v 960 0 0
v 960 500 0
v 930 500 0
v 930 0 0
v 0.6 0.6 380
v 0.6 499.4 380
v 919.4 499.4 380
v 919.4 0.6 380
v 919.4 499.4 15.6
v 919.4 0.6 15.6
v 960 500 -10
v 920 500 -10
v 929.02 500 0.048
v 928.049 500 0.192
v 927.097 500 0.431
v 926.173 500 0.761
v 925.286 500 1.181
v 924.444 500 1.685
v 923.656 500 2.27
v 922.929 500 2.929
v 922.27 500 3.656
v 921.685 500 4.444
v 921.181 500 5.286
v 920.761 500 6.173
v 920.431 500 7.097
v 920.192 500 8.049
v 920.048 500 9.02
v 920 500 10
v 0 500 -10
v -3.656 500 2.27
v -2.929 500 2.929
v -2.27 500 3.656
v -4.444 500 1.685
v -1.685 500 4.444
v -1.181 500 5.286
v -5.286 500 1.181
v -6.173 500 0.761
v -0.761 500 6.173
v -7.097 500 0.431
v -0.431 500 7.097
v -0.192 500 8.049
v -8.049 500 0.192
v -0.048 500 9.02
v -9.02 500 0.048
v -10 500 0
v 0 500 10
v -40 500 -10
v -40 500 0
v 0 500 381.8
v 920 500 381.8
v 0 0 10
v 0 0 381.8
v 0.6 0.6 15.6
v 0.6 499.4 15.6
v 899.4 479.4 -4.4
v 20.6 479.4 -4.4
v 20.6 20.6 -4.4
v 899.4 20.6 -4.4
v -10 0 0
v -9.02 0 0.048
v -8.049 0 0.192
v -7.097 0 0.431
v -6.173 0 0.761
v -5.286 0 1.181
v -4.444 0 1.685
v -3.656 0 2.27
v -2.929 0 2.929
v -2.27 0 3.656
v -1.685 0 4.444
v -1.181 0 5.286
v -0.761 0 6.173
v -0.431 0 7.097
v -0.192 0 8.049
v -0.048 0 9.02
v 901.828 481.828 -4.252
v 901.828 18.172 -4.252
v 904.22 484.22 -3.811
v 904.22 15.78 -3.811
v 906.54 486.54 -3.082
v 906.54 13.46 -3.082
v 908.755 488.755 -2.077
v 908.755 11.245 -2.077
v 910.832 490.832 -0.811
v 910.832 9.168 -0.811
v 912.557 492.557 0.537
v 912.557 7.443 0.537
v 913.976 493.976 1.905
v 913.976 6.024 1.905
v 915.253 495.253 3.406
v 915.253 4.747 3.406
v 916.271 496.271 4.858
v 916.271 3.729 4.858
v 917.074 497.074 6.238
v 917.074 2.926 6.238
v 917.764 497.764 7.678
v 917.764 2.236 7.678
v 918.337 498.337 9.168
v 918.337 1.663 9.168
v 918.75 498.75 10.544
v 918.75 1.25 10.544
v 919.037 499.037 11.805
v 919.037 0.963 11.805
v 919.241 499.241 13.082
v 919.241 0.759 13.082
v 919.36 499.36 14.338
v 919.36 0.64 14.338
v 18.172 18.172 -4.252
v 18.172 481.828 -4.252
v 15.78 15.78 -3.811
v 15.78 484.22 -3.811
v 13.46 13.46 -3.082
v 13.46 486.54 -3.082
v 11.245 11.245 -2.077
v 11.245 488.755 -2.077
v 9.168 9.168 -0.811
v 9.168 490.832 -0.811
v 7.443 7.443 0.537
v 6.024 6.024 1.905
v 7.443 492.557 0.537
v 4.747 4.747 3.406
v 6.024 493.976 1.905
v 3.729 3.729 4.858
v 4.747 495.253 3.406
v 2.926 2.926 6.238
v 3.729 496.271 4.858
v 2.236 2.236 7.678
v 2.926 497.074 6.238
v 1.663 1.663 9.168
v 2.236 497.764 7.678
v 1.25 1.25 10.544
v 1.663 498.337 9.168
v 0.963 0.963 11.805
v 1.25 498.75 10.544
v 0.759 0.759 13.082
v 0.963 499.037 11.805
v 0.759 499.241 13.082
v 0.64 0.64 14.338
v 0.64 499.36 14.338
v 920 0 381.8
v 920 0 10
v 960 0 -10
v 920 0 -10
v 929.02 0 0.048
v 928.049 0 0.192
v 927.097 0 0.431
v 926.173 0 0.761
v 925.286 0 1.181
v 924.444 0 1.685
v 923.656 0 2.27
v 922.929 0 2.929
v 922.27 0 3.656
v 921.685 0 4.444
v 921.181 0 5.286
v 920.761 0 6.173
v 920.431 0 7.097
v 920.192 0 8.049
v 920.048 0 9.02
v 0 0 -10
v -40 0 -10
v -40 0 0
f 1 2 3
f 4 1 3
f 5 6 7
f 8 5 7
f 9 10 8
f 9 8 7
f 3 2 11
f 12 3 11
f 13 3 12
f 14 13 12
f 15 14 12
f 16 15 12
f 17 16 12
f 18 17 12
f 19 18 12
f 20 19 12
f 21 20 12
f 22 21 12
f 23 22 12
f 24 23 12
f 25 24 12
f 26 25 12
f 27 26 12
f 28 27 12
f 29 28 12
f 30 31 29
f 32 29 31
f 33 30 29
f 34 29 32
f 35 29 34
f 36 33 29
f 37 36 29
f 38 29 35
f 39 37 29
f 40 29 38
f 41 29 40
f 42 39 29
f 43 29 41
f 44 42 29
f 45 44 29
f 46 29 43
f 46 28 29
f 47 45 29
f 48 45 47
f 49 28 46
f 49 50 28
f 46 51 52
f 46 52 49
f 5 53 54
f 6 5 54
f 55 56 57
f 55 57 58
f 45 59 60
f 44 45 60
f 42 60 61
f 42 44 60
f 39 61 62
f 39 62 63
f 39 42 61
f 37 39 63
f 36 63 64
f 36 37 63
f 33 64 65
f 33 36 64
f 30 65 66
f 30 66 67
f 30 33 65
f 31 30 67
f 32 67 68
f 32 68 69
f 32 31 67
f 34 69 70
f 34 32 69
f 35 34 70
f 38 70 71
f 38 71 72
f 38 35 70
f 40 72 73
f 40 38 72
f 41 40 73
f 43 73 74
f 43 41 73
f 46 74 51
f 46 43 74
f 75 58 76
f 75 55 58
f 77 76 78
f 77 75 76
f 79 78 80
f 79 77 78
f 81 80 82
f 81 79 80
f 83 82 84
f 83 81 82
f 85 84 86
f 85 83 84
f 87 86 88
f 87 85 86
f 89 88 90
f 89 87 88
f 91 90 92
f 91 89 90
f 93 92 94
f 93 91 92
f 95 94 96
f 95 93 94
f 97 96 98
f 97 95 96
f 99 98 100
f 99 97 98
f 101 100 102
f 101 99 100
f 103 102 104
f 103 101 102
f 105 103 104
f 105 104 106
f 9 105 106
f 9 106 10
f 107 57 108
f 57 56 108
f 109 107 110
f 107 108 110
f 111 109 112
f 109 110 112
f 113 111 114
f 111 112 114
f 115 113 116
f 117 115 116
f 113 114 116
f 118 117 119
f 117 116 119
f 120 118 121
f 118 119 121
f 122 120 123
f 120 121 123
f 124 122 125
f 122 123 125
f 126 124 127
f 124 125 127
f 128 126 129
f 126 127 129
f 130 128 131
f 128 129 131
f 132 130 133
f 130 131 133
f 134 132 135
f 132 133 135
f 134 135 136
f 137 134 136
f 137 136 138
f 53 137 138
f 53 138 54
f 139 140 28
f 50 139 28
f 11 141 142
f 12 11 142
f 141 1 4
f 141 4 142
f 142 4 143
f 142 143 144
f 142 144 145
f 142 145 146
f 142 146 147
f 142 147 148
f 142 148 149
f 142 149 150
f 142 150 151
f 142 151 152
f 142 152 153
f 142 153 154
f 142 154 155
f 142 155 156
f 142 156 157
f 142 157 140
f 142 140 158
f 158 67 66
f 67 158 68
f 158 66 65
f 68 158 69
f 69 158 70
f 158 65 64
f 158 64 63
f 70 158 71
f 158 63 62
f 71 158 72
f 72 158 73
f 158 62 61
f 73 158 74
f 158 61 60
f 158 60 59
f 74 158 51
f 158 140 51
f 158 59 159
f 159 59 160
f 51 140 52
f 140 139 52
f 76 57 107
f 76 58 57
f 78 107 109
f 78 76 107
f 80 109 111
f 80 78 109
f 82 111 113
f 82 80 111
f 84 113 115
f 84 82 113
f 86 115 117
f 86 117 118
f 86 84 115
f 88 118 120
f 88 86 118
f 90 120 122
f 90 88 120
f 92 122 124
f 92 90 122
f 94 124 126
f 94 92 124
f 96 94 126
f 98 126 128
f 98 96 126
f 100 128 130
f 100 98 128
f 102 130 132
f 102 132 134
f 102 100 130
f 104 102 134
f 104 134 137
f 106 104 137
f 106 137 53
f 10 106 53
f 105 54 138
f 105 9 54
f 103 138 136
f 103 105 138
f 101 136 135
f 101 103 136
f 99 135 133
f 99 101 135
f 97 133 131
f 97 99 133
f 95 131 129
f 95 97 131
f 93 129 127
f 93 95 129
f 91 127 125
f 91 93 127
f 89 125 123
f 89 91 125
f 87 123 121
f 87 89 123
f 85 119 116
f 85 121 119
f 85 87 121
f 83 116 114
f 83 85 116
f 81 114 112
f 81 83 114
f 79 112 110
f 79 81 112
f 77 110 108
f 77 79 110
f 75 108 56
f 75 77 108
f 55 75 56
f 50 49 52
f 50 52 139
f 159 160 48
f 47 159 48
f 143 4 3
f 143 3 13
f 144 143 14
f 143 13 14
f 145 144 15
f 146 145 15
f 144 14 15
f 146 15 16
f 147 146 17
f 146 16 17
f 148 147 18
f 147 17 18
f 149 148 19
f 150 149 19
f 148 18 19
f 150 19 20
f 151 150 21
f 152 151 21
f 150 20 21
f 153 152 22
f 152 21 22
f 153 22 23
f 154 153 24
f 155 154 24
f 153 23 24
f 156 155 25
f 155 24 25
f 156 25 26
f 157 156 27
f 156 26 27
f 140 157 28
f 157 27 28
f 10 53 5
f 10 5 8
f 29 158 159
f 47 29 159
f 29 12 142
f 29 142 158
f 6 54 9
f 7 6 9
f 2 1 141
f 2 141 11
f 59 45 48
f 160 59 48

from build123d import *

# Parameters (mm, degrees)
IZIM1_W                     = 920
IZIM1_H                     = 500
Y_KSEKLIK_EKSTR_ZYON1_DEPTH = 380
BO_ALTMA1_T                 = -0.6
IZIM2_W                     = 920
IZIM2_H                     = 500
Y_KSEKLIK_EKSTR_ZYON2_DEPTH = 1.8
IZIM3_W                     = 1000
IZIM3_H                     = 500
Y_KSEKLIK_EKSTR_ZYON3_DEPTH = 10
RADYUS1_R                   = 10
IZIM4_W                     = 918.8
IZIM4_H                     = 498.8
KES_EKSTR_ZYON1_DEPTH       = 5
RADYUS2_R                   = 20
IZIM5_W                     = 920
IZIM5_H                     = 500
KES_EKSTR_ZYON2_DEPTH       = 0.0001


with BuildPart() as part:
    # Çizim1 → Yükseklik-Ekstrüzyon1 (new body)
    with BuildSketch(Plane.XY):
        with Locations((460, 250)):
            Rectangle(IZIM1_W, IZIM1_H)
    extrude(amount=Y_KSEKLIK_EKSTR_ZYON1_DEPTH)

    # İç Boşaltma1
    bo_altma1_openings = [part.faces().sort_by_distance(p)[0] for p in [
        (460, 250, 380),
    ]]
    offset(amount=BO_ALTMA1_T, openings=bo_altma1_openings, kind=Kind.INTERSECTION)

    # Çizim2 → Yükseklik-Ekstrüzyon2 (add)
    with BuildSketch(Plane.XY.offset(380)):
        with Locations((460, 250)):
            Rectangle(IZIM2_W, IZIM2_H)
    extrude(amount=Y_KSEKLIK_EKSTR_ZYON2_DEPTH)

    # Çizim3 → Yükseklik-Ekstrüzyon3 (add)
    with BuildSketch(Plane(origin=(0, 0, 0), x_dir=(-1, 0, 0), z_dir=(0, 0, -1))):
        with Locations((-460, 250)):
            Rectangle(IZIM3_W, IZIM3_H)
    extrude(amount=Y_KSEKLIK_EKSTR_ZYON3_DEPTH)

    # Radyus1
    radyus1_edges = [part.edges().sort_by_distance(p)[0] for p in [
        (0, 250, 0),
        (920, 250, 0),
    ]]
    fillet(radyus1_edges, radius=RADYUS1_R)

    # Çizim4 → Kes-Ekstrüzyon1 (cut)
    with BuildSketch(Plane.XY.offset(0.6)):
        with Locations((460, 250)):
            Rectangle(IZIM4_W, IZIM4_H)
    extrude(amount=-KES_EKSTR_ZYON1_DEPTH, mode=Mode.SUBTRACT)

    # Radyus2
    radyus2_edges = [part.edges().sort_by_distance(p)[0] for p in [
        (919.4, 250, -4.4),
        (460, 0.6, -4.4),
        (0.6, 250, -4.4),
        (460, 499.4, -4.4),
    ]]
    fillet(radyus2_edges, radius=RADYUS2_R)

    # Çizim5 → Kes-Ekstrüzyon2 (cut)
    with BuildSketch(Plane(origin=(0, 0, -10), x_dir=(-1, 0, 0), z_dir=(0, 0, -1))):
        with Locations((-460, 250)):
            Rectangle(IZIM5_W, IZIM5_H)
    extrude(amount=-KES_EKSTR_ZYON2_DEPTH, mode=Mode.SUBTRACT)


solid = part.part
